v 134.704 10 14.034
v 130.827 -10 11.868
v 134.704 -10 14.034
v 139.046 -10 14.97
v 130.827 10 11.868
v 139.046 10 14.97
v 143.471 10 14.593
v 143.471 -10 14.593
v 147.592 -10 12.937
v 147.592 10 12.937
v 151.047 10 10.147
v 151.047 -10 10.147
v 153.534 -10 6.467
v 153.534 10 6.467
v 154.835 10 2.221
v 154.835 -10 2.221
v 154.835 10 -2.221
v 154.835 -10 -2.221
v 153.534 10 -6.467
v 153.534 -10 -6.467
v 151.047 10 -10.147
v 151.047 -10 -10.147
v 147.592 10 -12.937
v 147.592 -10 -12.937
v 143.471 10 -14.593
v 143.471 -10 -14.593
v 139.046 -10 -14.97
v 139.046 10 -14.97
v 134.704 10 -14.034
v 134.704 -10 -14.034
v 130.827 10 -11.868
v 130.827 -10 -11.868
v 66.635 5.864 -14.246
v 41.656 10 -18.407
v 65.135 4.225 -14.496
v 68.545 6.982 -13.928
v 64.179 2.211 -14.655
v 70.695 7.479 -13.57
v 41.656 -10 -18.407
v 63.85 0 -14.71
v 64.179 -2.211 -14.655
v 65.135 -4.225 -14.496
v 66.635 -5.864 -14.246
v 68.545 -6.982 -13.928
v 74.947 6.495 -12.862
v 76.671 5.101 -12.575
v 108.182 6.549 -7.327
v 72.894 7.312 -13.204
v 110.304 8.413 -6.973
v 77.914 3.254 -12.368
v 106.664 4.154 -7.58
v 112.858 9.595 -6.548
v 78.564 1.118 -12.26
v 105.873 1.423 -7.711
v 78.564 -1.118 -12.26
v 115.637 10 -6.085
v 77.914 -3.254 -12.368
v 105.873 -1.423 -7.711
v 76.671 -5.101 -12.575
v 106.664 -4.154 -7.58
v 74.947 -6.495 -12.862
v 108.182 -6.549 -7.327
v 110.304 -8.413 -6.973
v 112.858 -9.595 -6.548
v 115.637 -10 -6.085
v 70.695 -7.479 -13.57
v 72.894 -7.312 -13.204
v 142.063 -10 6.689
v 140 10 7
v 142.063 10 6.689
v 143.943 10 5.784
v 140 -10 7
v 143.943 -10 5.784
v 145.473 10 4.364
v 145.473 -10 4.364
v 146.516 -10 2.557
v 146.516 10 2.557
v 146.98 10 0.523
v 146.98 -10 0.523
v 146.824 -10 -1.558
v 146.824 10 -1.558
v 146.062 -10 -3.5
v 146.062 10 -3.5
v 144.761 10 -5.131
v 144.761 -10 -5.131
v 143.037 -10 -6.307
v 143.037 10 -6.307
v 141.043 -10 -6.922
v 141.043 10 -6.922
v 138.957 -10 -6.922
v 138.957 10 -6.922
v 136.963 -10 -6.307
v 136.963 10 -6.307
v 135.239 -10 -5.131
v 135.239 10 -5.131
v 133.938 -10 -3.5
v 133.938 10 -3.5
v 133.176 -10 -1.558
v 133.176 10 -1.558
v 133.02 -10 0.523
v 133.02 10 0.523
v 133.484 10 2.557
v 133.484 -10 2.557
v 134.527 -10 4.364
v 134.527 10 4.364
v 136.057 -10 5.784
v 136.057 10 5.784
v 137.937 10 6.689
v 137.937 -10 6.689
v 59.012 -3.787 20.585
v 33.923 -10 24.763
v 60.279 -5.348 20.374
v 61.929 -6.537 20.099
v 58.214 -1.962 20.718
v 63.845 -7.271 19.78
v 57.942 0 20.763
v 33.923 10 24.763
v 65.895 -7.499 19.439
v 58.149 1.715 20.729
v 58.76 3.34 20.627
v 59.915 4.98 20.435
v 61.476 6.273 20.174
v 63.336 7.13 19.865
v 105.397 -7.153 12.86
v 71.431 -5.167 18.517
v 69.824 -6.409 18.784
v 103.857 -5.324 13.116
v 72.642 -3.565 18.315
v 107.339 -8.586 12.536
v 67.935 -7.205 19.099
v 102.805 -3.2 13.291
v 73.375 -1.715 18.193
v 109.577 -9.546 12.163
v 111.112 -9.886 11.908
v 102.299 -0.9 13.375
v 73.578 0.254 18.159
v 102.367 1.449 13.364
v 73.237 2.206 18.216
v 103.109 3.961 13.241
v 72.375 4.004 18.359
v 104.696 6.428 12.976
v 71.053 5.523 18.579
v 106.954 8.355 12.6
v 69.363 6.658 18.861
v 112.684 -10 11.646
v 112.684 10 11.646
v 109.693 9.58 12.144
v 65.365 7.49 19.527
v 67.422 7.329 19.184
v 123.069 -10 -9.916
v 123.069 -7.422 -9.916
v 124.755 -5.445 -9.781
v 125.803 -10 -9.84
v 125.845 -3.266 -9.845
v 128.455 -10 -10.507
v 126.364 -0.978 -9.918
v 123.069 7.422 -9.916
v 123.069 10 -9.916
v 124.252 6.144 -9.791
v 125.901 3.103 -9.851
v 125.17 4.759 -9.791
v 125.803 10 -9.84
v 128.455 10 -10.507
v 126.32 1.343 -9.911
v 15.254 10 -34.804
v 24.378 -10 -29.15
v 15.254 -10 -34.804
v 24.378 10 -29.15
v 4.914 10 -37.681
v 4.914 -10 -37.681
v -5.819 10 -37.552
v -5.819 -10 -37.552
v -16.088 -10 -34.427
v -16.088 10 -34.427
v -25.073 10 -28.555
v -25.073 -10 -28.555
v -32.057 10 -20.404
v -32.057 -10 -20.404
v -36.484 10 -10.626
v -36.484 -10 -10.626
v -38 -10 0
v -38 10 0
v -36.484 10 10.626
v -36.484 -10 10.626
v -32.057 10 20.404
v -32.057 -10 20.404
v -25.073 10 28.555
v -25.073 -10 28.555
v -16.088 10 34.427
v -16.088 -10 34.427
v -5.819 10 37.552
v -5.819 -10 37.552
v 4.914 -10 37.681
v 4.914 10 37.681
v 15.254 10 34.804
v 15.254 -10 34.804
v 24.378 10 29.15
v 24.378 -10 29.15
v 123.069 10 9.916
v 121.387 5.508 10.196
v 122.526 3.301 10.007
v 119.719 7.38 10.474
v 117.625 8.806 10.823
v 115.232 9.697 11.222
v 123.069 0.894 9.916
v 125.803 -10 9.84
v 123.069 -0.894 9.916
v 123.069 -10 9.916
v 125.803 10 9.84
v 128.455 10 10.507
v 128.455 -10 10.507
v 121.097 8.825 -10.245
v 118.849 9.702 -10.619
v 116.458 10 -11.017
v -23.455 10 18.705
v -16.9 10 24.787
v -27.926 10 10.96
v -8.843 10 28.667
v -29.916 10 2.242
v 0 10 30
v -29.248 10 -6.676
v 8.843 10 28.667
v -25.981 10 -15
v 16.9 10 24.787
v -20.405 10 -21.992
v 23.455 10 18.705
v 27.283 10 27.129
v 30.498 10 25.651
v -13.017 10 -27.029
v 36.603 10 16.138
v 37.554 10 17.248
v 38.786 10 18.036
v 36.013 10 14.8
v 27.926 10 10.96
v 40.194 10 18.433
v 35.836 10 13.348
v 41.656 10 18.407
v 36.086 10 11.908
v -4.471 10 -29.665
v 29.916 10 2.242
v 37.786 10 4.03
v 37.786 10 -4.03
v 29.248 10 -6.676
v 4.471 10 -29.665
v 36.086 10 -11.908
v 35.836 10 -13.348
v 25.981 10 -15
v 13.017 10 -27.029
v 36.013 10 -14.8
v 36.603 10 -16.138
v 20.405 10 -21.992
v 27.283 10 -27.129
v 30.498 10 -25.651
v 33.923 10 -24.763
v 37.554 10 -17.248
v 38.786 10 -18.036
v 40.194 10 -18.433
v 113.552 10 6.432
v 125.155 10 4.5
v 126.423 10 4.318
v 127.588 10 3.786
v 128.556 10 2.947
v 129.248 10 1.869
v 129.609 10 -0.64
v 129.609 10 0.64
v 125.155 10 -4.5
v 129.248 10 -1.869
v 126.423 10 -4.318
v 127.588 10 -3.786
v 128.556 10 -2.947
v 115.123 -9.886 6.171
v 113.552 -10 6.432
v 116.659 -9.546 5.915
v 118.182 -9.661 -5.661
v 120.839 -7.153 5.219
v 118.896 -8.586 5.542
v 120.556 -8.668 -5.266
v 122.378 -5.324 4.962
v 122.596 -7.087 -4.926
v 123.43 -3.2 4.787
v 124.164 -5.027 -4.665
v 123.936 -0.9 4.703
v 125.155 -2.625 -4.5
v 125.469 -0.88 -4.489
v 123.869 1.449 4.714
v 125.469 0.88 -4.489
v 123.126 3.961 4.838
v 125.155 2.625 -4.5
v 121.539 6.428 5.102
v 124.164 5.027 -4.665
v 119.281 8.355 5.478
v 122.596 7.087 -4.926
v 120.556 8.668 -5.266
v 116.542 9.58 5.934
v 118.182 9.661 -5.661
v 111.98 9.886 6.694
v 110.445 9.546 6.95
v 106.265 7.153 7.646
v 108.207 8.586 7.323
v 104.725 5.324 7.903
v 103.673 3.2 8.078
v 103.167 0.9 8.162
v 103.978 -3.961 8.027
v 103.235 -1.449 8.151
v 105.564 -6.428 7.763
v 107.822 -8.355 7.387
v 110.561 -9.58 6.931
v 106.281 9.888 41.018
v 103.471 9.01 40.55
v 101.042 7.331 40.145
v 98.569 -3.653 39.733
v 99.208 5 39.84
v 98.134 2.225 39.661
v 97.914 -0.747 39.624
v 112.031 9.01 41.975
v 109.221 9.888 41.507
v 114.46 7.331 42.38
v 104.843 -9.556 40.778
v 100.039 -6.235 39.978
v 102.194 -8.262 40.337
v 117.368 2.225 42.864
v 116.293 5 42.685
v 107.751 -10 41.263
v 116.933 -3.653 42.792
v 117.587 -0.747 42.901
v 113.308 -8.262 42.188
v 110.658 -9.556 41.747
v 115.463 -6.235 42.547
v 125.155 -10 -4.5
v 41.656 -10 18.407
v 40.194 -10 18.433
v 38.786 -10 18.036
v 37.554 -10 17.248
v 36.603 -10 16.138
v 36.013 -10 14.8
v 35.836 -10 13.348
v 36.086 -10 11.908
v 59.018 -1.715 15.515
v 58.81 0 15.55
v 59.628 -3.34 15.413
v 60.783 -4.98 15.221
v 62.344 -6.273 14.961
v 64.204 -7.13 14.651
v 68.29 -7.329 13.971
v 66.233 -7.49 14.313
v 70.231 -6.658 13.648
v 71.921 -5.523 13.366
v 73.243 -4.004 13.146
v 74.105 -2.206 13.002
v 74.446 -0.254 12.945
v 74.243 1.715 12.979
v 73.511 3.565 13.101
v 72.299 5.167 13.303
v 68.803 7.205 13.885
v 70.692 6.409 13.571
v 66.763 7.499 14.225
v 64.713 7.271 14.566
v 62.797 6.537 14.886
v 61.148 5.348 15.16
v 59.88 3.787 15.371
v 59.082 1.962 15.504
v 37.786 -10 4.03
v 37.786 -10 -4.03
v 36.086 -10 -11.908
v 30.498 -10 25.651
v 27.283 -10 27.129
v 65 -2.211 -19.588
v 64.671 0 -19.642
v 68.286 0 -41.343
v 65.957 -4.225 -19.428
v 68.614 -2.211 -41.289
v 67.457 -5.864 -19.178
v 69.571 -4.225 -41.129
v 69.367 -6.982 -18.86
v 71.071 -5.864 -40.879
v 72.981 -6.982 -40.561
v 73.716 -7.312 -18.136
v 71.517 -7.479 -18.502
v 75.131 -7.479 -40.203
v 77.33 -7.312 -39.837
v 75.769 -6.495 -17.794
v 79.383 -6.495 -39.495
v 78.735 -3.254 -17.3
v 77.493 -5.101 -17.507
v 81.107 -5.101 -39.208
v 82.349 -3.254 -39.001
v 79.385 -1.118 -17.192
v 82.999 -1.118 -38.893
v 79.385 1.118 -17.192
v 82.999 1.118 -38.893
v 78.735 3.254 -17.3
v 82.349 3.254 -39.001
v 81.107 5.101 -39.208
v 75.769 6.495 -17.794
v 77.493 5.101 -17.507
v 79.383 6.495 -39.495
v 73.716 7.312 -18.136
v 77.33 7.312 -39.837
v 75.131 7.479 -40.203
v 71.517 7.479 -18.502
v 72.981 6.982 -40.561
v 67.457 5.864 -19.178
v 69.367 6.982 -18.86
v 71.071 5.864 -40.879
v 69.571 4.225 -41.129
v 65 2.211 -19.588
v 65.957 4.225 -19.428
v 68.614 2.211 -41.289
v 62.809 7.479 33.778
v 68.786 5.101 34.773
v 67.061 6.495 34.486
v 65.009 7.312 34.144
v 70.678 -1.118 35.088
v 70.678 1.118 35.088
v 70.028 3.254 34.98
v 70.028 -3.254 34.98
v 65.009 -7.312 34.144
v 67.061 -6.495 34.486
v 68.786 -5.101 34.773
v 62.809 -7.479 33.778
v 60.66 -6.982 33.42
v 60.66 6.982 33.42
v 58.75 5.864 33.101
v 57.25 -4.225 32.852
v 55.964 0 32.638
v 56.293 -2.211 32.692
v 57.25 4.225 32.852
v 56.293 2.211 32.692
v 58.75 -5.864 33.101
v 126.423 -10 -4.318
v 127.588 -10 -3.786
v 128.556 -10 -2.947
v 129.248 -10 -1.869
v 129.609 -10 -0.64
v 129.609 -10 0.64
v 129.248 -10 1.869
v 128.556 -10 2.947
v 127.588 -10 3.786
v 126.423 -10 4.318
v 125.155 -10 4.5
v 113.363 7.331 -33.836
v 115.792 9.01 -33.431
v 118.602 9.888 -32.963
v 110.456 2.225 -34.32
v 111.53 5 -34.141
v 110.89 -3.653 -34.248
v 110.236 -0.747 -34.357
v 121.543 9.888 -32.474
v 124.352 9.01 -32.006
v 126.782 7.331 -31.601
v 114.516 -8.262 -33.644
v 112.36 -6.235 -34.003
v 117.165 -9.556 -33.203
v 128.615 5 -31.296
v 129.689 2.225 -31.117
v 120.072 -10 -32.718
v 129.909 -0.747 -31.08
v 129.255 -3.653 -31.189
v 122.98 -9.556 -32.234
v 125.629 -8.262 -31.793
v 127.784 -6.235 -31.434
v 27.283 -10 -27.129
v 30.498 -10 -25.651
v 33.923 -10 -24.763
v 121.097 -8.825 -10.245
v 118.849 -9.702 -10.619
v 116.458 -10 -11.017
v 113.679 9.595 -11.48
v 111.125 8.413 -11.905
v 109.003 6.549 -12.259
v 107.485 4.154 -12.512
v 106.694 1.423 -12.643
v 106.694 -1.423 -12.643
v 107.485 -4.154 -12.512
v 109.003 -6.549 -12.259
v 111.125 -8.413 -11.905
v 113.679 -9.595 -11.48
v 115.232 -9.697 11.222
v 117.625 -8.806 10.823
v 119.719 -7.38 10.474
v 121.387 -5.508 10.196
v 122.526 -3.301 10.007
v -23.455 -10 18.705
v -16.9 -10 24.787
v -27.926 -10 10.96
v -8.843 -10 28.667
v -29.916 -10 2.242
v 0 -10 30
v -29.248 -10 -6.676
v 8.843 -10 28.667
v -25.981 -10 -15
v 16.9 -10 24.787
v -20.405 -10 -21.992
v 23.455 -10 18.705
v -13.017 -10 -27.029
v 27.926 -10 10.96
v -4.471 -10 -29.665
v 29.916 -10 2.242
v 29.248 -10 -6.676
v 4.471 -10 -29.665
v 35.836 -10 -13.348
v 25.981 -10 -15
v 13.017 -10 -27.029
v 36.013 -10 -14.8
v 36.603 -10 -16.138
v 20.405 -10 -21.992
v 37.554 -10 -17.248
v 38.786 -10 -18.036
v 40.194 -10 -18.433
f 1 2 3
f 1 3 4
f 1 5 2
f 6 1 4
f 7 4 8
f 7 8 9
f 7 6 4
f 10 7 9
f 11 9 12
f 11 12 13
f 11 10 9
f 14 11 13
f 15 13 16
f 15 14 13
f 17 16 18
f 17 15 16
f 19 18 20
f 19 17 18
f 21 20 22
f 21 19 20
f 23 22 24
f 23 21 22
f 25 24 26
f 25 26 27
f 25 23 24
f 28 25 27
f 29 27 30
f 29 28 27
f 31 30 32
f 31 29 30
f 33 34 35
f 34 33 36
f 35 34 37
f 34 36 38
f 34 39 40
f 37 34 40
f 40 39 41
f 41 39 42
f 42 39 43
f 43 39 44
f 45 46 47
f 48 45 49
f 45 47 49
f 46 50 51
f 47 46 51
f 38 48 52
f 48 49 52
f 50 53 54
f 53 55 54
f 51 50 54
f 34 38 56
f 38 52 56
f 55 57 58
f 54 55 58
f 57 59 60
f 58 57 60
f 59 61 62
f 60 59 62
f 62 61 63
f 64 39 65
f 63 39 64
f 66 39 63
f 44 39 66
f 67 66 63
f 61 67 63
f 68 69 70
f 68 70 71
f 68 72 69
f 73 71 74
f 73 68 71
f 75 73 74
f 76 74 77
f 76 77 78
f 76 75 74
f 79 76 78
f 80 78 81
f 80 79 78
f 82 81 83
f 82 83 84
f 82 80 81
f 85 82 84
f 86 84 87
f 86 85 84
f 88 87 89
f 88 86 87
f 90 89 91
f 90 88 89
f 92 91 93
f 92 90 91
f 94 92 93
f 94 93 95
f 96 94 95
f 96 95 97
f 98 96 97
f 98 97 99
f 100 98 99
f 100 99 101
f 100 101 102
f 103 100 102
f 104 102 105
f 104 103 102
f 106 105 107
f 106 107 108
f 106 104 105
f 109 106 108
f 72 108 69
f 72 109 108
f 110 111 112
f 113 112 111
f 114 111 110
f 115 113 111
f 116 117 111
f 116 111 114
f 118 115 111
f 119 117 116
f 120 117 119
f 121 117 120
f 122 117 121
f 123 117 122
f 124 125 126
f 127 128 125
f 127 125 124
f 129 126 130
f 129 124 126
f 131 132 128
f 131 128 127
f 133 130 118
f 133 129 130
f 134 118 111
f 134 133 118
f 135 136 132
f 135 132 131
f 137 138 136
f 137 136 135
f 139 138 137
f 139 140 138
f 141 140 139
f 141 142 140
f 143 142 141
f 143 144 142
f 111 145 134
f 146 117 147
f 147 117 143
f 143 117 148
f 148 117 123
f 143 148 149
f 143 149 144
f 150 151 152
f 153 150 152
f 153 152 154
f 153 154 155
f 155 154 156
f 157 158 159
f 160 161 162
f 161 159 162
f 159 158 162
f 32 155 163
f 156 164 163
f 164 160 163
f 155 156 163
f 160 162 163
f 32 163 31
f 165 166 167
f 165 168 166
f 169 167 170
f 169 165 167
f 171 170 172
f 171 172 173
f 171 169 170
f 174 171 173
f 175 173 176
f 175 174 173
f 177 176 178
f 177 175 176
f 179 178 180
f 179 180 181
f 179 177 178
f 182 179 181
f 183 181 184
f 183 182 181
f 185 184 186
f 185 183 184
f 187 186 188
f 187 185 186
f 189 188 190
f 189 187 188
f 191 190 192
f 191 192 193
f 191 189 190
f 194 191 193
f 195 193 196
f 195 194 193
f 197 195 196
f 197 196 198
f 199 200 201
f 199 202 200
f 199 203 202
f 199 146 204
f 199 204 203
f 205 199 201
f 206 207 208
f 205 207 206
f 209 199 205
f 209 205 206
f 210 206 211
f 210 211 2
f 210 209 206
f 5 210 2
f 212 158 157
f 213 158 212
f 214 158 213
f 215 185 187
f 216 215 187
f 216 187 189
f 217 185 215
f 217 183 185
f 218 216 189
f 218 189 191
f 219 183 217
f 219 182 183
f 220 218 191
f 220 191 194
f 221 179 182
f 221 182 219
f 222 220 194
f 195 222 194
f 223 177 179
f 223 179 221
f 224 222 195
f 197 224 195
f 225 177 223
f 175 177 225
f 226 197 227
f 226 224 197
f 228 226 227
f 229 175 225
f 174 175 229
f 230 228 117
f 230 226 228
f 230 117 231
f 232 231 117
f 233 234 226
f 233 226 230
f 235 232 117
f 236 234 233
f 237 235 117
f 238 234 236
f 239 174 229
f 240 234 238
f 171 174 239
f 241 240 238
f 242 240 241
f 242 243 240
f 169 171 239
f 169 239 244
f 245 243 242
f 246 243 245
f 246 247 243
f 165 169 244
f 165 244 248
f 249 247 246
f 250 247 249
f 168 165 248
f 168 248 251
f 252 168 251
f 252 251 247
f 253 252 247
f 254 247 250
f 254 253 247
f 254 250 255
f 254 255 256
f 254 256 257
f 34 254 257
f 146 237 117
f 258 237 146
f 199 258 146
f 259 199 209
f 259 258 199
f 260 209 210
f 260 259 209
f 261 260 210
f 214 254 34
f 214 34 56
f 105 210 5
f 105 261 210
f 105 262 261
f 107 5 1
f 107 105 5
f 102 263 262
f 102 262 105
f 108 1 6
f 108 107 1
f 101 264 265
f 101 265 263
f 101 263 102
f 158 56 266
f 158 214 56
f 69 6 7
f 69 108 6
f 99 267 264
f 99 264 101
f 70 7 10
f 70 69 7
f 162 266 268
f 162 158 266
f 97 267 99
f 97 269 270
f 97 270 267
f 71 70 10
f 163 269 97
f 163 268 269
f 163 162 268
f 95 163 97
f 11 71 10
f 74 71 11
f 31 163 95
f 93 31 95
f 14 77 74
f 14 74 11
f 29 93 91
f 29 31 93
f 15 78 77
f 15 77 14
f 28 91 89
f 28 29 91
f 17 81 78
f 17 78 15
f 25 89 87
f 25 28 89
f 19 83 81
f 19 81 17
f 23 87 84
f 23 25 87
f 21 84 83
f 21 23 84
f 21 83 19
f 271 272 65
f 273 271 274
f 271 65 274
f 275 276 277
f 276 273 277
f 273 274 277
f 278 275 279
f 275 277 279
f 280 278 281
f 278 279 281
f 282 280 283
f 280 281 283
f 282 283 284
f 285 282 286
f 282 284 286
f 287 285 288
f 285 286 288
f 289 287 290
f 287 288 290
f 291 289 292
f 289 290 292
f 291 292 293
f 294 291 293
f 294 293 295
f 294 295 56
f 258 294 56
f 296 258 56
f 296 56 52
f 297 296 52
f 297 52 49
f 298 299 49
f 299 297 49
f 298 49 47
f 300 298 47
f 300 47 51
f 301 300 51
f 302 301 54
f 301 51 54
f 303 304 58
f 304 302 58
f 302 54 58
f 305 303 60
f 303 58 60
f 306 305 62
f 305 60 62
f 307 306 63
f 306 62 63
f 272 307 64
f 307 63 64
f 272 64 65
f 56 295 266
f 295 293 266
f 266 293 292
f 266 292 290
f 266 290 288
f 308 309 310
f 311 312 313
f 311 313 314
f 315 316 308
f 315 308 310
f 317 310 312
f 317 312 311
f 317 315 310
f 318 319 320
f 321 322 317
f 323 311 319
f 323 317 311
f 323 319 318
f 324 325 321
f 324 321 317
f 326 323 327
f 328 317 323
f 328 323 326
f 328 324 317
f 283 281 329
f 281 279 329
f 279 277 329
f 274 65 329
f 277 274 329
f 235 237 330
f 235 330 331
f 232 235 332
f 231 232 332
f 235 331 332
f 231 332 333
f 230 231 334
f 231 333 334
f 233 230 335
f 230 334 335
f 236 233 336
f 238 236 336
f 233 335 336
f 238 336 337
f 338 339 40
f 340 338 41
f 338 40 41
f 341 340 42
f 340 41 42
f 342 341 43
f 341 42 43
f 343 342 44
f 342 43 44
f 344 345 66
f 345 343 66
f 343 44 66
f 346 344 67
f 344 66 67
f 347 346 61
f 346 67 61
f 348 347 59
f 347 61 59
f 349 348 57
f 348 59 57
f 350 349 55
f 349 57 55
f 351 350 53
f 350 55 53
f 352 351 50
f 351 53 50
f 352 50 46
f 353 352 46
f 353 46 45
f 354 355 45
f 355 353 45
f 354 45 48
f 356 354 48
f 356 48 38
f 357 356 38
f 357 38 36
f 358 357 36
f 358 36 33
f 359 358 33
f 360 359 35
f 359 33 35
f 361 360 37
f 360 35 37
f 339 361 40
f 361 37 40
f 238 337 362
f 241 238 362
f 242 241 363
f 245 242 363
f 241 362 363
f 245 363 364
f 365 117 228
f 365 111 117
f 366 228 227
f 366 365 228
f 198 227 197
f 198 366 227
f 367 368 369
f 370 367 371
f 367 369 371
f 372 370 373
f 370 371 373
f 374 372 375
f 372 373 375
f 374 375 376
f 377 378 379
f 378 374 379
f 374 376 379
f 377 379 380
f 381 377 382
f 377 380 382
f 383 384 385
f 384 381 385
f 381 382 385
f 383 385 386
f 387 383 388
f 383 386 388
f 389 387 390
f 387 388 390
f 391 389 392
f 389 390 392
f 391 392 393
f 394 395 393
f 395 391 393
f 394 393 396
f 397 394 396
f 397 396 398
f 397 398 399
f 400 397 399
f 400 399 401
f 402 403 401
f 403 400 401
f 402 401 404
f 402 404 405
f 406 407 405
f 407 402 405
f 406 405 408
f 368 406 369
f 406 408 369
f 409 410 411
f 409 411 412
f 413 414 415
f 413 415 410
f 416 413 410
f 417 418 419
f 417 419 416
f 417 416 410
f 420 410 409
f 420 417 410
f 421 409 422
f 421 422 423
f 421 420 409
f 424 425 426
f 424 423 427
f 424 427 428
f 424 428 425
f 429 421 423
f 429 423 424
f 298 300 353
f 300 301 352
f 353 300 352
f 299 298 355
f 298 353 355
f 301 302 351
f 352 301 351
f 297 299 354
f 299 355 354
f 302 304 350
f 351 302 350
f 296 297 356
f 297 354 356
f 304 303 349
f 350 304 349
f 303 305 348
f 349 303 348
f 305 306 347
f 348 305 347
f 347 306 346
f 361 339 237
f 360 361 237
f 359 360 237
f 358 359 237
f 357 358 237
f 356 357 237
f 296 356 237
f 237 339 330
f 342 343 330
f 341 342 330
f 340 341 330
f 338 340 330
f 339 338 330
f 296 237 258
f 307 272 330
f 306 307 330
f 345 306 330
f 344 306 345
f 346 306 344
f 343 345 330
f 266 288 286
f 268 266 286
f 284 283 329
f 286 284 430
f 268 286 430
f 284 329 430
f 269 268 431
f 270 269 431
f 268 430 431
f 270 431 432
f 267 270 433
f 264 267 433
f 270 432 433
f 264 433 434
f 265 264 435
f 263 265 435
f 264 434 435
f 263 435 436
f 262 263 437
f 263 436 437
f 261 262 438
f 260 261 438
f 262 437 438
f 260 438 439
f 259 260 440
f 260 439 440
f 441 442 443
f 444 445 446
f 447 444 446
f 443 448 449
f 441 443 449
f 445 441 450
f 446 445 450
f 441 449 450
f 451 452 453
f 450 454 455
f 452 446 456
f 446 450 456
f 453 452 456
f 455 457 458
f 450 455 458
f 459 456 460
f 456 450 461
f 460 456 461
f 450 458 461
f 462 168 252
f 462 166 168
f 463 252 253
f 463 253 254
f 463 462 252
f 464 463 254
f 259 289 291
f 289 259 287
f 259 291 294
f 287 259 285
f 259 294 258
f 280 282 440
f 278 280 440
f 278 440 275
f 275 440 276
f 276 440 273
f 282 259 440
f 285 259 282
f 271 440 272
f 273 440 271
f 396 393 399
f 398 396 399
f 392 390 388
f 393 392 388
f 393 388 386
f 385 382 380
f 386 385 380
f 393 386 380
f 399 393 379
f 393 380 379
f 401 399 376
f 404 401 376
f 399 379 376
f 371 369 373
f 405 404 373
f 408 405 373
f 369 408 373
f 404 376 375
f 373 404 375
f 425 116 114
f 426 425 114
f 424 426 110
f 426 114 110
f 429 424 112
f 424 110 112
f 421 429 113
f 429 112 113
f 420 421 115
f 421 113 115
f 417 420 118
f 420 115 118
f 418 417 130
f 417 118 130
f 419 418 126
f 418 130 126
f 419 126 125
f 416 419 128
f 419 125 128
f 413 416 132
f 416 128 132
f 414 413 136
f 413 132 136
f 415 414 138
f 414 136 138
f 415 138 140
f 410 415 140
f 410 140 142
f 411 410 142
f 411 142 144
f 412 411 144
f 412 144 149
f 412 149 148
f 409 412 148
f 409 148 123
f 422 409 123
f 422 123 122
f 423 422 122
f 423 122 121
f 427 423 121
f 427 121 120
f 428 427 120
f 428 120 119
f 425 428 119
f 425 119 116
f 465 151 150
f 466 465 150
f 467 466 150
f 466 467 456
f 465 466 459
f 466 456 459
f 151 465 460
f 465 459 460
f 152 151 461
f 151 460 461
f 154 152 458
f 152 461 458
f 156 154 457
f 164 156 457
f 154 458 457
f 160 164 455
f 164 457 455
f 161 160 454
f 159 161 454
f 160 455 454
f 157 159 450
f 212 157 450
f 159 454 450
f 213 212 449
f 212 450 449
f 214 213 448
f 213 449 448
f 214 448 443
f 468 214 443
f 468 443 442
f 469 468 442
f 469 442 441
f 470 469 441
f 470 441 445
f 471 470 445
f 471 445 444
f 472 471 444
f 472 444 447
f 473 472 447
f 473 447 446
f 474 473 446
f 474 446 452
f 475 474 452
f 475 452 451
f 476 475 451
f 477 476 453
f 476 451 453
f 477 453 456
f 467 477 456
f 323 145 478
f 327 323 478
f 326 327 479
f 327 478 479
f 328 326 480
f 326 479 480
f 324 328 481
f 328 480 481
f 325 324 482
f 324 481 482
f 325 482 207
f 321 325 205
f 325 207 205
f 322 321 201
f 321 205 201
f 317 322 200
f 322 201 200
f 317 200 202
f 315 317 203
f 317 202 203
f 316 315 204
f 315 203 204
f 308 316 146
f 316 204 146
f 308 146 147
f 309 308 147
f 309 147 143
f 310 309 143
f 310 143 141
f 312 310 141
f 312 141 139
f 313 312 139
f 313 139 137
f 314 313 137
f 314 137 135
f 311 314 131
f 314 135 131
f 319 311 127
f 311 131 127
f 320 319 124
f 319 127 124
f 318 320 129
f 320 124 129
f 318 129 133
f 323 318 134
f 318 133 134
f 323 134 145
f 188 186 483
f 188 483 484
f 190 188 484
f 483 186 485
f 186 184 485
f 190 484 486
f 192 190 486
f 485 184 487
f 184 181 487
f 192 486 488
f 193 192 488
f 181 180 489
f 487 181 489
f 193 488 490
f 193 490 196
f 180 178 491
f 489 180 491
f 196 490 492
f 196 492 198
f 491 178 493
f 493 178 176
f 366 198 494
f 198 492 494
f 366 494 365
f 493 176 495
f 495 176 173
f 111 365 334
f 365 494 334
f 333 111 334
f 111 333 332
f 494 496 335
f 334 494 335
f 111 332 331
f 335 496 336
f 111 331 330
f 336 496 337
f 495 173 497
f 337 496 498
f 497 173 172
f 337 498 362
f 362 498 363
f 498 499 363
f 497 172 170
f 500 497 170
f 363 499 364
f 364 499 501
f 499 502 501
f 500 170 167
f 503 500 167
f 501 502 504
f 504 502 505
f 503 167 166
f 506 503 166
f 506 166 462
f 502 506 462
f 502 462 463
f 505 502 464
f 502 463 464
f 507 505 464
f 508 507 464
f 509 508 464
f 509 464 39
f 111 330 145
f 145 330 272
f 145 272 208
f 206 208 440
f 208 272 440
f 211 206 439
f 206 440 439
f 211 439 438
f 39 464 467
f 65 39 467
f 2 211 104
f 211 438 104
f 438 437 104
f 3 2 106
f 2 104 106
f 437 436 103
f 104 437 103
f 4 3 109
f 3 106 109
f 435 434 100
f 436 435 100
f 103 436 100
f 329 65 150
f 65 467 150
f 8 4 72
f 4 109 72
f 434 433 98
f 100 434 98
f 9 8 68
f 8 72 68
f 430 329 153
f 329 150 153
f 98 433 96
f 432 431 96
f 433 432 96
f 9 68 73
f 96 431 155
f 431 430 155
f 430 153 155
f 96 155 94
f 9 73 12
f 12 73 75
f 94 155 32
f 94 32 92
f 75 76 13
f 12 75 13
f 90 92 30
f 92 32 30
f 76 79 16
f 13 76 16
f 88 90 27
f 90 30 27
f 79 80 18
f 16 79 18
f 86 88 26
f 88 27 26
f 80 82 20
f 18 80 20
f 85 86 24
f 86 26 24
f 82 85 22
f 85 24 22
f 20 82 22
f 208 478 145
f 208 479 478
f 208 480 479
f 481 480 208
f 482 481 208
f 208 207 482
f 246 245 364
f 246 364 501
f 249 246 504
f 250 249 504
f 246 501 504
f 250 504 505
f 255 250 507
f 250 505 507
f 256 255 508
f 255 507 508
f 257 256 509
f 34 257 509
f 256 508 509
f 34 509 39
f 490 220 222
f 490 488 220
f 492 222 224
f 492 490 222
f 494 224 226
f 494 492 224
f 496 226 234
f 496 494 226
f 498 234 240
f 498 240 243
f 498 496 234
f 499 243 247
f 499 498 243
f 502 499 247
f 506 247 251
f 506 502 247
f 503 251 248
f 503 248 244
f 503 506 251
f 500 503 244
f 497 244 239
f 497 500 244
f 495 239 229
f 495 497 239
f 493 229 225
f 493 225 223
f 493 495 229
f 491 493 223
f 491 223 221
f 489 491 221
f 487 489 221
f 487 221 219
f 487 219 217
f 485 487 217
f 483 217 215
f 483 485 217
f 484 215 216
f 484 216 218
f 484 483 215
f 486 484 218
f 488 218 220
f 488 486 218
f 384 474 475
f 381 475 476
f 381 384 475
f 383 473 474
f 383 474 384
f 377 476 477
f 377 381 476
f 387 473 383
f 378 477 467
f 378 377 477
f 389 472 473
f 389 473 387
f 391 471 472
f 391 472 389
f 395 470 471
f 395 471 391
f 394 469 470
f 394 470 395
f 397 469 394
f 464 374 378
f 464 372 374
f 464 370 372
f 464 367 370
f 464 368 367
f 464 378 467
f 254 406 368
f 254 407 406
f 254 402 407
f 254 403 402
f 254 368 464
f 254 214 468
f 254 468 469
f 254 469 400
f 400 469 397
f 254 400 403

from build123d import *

# Parameters (mm, degrees)
SKETCH1_R                = 30
SKETCH1_R_2              = 7
BOSS_EXTRUDE1_DEPTH      = 10
FILLET1_R                = 10
FILLET2_R                = 20
CUT_EXTRUDE1_DEPTH       = 10
BOSS_EXTRUDE4_DEPTH      = 48
BOSS_EXTRUDE4_DEPTH_BACK = 27
SKETCH3_R                = 10
SKETCH3_R_2              = 7.5


with BuildPart() as part:
    # Sketch1 → Boss-Extrude1 (new, symmetric)
    with BuildSketch(Plane(origin=(0, 0, 0), x_dir=(1, 0, 0), z_dir=(0, 1, 0))):
        with BuildLine():
            Line((27.935473676, -25.760615491), (128.063755469, -9.084385863))
            ThreePointArc((128.063755469, -9.084385863), (155, 0), (128.063755469, 9.084385863))
            Line((128.063755469, 9.084385863), (27.935473676, 25.760615491))
            ThreePointArc((27.935473676, 25.760615491), (-38, 0), (27.935473676, -25.760615491))
        make_face()
        with Locations(Location((0, 0, 0), (0, 0, 270))):
            Circle(SKETCH1_R, mode=Mode.SUBTRACT)
        with Locations(Location((140, 0, 0), (0, 0, 270))):
            Circle(SKETCH1_R_2, mode=Mode.SUBTRACT)
    extrude(amount=BOSS_EXTRUDE1_DEPTH, both=True)

    # Fillet1
    fillet1_edges = [part.edges().sort_by_distance(p)[0] for p in [
        (128.063755469, 0, -9.084385863),
        (128.063755469, 0, 9.084385863),
    ]]
    fillet(fillet1_edges, radius=FILLET1_R)

    # Fillet2
    fillet2_edges = [part.edges().sort_by_distance(p)[0] for p in [
        (27.935473676, 0, -25.760615491),
        (27.935473676, 0, 25.760615491),
    ]]
    fillet(fillet2_edges, radius=FILLET2_R)

    # Sketch2 → Cut-Extrude1 (cut)
    with BuildSketch(Plane(origin=(0, 10, 0), x_dir=(1, 0, 0), z_dir=(0, 1, 0))):
        with BuildLine():
            Line((41.655668603, 18.406663826), (125.154779936, 4.5))
            ThreePointArc((125.154779936, 4.5), (129.654779936, 0), (125.154779936, -4.5))
            Line((125.154779936, -4.5), (41.655668603, -18.406663826))
            ThreePointArc((41.655668603, -18.406663826), (37.03770568, -16.72826346), (36.086072586, -11.907785911))
            ThreePointArc((36.086072586, -11.907785911), (38, 0), (36.086072586, 11.907785911))
            ThreePointArc((36.086072586, 11.907785911), (37.03770568, 16.72826346), (41.655668603, 18.406663826))
        make_face()
    cut_extrude1 = extrude(amount=-CUT_EXTRUDE1_DEPTH, mode=Mode.SUBTRACT)

    # Mirror1: Cut-Extrude1 across plane
    add(cut_extrude1.mirror(Plane.ZX), mode=Mode.SUBTRACT)

    # Sketch3 → Boss-Extrude4 (add, two sides: drawn at the far end of the back side and taken through both)
    with BuildSketch(Plane(origin=(4.107142857, 0, -24.6603199), x_dir=(0.9864127959843347, 0, 0.16428571428571412), z_dir=(-0.16428571428571412, 0, 0.9864127959843348)).offset(-BOSS_EXTRUDE4_DEPTH_BACK)):
        with Locations(Location((113.065732621, 0, 0), (0, 0, 270))):
            Circle(SKETCH3_R)
        with Locations(Location((68.065732621, 0, 0), (0, 0, 180))):
            Circle(SKETCH3_R_2)
    extrude(amount=BOSS_EXTRUDE4_DEPTH + BOSS_EXTRUDE4_DEPTH_BACK)


solid = part.part
